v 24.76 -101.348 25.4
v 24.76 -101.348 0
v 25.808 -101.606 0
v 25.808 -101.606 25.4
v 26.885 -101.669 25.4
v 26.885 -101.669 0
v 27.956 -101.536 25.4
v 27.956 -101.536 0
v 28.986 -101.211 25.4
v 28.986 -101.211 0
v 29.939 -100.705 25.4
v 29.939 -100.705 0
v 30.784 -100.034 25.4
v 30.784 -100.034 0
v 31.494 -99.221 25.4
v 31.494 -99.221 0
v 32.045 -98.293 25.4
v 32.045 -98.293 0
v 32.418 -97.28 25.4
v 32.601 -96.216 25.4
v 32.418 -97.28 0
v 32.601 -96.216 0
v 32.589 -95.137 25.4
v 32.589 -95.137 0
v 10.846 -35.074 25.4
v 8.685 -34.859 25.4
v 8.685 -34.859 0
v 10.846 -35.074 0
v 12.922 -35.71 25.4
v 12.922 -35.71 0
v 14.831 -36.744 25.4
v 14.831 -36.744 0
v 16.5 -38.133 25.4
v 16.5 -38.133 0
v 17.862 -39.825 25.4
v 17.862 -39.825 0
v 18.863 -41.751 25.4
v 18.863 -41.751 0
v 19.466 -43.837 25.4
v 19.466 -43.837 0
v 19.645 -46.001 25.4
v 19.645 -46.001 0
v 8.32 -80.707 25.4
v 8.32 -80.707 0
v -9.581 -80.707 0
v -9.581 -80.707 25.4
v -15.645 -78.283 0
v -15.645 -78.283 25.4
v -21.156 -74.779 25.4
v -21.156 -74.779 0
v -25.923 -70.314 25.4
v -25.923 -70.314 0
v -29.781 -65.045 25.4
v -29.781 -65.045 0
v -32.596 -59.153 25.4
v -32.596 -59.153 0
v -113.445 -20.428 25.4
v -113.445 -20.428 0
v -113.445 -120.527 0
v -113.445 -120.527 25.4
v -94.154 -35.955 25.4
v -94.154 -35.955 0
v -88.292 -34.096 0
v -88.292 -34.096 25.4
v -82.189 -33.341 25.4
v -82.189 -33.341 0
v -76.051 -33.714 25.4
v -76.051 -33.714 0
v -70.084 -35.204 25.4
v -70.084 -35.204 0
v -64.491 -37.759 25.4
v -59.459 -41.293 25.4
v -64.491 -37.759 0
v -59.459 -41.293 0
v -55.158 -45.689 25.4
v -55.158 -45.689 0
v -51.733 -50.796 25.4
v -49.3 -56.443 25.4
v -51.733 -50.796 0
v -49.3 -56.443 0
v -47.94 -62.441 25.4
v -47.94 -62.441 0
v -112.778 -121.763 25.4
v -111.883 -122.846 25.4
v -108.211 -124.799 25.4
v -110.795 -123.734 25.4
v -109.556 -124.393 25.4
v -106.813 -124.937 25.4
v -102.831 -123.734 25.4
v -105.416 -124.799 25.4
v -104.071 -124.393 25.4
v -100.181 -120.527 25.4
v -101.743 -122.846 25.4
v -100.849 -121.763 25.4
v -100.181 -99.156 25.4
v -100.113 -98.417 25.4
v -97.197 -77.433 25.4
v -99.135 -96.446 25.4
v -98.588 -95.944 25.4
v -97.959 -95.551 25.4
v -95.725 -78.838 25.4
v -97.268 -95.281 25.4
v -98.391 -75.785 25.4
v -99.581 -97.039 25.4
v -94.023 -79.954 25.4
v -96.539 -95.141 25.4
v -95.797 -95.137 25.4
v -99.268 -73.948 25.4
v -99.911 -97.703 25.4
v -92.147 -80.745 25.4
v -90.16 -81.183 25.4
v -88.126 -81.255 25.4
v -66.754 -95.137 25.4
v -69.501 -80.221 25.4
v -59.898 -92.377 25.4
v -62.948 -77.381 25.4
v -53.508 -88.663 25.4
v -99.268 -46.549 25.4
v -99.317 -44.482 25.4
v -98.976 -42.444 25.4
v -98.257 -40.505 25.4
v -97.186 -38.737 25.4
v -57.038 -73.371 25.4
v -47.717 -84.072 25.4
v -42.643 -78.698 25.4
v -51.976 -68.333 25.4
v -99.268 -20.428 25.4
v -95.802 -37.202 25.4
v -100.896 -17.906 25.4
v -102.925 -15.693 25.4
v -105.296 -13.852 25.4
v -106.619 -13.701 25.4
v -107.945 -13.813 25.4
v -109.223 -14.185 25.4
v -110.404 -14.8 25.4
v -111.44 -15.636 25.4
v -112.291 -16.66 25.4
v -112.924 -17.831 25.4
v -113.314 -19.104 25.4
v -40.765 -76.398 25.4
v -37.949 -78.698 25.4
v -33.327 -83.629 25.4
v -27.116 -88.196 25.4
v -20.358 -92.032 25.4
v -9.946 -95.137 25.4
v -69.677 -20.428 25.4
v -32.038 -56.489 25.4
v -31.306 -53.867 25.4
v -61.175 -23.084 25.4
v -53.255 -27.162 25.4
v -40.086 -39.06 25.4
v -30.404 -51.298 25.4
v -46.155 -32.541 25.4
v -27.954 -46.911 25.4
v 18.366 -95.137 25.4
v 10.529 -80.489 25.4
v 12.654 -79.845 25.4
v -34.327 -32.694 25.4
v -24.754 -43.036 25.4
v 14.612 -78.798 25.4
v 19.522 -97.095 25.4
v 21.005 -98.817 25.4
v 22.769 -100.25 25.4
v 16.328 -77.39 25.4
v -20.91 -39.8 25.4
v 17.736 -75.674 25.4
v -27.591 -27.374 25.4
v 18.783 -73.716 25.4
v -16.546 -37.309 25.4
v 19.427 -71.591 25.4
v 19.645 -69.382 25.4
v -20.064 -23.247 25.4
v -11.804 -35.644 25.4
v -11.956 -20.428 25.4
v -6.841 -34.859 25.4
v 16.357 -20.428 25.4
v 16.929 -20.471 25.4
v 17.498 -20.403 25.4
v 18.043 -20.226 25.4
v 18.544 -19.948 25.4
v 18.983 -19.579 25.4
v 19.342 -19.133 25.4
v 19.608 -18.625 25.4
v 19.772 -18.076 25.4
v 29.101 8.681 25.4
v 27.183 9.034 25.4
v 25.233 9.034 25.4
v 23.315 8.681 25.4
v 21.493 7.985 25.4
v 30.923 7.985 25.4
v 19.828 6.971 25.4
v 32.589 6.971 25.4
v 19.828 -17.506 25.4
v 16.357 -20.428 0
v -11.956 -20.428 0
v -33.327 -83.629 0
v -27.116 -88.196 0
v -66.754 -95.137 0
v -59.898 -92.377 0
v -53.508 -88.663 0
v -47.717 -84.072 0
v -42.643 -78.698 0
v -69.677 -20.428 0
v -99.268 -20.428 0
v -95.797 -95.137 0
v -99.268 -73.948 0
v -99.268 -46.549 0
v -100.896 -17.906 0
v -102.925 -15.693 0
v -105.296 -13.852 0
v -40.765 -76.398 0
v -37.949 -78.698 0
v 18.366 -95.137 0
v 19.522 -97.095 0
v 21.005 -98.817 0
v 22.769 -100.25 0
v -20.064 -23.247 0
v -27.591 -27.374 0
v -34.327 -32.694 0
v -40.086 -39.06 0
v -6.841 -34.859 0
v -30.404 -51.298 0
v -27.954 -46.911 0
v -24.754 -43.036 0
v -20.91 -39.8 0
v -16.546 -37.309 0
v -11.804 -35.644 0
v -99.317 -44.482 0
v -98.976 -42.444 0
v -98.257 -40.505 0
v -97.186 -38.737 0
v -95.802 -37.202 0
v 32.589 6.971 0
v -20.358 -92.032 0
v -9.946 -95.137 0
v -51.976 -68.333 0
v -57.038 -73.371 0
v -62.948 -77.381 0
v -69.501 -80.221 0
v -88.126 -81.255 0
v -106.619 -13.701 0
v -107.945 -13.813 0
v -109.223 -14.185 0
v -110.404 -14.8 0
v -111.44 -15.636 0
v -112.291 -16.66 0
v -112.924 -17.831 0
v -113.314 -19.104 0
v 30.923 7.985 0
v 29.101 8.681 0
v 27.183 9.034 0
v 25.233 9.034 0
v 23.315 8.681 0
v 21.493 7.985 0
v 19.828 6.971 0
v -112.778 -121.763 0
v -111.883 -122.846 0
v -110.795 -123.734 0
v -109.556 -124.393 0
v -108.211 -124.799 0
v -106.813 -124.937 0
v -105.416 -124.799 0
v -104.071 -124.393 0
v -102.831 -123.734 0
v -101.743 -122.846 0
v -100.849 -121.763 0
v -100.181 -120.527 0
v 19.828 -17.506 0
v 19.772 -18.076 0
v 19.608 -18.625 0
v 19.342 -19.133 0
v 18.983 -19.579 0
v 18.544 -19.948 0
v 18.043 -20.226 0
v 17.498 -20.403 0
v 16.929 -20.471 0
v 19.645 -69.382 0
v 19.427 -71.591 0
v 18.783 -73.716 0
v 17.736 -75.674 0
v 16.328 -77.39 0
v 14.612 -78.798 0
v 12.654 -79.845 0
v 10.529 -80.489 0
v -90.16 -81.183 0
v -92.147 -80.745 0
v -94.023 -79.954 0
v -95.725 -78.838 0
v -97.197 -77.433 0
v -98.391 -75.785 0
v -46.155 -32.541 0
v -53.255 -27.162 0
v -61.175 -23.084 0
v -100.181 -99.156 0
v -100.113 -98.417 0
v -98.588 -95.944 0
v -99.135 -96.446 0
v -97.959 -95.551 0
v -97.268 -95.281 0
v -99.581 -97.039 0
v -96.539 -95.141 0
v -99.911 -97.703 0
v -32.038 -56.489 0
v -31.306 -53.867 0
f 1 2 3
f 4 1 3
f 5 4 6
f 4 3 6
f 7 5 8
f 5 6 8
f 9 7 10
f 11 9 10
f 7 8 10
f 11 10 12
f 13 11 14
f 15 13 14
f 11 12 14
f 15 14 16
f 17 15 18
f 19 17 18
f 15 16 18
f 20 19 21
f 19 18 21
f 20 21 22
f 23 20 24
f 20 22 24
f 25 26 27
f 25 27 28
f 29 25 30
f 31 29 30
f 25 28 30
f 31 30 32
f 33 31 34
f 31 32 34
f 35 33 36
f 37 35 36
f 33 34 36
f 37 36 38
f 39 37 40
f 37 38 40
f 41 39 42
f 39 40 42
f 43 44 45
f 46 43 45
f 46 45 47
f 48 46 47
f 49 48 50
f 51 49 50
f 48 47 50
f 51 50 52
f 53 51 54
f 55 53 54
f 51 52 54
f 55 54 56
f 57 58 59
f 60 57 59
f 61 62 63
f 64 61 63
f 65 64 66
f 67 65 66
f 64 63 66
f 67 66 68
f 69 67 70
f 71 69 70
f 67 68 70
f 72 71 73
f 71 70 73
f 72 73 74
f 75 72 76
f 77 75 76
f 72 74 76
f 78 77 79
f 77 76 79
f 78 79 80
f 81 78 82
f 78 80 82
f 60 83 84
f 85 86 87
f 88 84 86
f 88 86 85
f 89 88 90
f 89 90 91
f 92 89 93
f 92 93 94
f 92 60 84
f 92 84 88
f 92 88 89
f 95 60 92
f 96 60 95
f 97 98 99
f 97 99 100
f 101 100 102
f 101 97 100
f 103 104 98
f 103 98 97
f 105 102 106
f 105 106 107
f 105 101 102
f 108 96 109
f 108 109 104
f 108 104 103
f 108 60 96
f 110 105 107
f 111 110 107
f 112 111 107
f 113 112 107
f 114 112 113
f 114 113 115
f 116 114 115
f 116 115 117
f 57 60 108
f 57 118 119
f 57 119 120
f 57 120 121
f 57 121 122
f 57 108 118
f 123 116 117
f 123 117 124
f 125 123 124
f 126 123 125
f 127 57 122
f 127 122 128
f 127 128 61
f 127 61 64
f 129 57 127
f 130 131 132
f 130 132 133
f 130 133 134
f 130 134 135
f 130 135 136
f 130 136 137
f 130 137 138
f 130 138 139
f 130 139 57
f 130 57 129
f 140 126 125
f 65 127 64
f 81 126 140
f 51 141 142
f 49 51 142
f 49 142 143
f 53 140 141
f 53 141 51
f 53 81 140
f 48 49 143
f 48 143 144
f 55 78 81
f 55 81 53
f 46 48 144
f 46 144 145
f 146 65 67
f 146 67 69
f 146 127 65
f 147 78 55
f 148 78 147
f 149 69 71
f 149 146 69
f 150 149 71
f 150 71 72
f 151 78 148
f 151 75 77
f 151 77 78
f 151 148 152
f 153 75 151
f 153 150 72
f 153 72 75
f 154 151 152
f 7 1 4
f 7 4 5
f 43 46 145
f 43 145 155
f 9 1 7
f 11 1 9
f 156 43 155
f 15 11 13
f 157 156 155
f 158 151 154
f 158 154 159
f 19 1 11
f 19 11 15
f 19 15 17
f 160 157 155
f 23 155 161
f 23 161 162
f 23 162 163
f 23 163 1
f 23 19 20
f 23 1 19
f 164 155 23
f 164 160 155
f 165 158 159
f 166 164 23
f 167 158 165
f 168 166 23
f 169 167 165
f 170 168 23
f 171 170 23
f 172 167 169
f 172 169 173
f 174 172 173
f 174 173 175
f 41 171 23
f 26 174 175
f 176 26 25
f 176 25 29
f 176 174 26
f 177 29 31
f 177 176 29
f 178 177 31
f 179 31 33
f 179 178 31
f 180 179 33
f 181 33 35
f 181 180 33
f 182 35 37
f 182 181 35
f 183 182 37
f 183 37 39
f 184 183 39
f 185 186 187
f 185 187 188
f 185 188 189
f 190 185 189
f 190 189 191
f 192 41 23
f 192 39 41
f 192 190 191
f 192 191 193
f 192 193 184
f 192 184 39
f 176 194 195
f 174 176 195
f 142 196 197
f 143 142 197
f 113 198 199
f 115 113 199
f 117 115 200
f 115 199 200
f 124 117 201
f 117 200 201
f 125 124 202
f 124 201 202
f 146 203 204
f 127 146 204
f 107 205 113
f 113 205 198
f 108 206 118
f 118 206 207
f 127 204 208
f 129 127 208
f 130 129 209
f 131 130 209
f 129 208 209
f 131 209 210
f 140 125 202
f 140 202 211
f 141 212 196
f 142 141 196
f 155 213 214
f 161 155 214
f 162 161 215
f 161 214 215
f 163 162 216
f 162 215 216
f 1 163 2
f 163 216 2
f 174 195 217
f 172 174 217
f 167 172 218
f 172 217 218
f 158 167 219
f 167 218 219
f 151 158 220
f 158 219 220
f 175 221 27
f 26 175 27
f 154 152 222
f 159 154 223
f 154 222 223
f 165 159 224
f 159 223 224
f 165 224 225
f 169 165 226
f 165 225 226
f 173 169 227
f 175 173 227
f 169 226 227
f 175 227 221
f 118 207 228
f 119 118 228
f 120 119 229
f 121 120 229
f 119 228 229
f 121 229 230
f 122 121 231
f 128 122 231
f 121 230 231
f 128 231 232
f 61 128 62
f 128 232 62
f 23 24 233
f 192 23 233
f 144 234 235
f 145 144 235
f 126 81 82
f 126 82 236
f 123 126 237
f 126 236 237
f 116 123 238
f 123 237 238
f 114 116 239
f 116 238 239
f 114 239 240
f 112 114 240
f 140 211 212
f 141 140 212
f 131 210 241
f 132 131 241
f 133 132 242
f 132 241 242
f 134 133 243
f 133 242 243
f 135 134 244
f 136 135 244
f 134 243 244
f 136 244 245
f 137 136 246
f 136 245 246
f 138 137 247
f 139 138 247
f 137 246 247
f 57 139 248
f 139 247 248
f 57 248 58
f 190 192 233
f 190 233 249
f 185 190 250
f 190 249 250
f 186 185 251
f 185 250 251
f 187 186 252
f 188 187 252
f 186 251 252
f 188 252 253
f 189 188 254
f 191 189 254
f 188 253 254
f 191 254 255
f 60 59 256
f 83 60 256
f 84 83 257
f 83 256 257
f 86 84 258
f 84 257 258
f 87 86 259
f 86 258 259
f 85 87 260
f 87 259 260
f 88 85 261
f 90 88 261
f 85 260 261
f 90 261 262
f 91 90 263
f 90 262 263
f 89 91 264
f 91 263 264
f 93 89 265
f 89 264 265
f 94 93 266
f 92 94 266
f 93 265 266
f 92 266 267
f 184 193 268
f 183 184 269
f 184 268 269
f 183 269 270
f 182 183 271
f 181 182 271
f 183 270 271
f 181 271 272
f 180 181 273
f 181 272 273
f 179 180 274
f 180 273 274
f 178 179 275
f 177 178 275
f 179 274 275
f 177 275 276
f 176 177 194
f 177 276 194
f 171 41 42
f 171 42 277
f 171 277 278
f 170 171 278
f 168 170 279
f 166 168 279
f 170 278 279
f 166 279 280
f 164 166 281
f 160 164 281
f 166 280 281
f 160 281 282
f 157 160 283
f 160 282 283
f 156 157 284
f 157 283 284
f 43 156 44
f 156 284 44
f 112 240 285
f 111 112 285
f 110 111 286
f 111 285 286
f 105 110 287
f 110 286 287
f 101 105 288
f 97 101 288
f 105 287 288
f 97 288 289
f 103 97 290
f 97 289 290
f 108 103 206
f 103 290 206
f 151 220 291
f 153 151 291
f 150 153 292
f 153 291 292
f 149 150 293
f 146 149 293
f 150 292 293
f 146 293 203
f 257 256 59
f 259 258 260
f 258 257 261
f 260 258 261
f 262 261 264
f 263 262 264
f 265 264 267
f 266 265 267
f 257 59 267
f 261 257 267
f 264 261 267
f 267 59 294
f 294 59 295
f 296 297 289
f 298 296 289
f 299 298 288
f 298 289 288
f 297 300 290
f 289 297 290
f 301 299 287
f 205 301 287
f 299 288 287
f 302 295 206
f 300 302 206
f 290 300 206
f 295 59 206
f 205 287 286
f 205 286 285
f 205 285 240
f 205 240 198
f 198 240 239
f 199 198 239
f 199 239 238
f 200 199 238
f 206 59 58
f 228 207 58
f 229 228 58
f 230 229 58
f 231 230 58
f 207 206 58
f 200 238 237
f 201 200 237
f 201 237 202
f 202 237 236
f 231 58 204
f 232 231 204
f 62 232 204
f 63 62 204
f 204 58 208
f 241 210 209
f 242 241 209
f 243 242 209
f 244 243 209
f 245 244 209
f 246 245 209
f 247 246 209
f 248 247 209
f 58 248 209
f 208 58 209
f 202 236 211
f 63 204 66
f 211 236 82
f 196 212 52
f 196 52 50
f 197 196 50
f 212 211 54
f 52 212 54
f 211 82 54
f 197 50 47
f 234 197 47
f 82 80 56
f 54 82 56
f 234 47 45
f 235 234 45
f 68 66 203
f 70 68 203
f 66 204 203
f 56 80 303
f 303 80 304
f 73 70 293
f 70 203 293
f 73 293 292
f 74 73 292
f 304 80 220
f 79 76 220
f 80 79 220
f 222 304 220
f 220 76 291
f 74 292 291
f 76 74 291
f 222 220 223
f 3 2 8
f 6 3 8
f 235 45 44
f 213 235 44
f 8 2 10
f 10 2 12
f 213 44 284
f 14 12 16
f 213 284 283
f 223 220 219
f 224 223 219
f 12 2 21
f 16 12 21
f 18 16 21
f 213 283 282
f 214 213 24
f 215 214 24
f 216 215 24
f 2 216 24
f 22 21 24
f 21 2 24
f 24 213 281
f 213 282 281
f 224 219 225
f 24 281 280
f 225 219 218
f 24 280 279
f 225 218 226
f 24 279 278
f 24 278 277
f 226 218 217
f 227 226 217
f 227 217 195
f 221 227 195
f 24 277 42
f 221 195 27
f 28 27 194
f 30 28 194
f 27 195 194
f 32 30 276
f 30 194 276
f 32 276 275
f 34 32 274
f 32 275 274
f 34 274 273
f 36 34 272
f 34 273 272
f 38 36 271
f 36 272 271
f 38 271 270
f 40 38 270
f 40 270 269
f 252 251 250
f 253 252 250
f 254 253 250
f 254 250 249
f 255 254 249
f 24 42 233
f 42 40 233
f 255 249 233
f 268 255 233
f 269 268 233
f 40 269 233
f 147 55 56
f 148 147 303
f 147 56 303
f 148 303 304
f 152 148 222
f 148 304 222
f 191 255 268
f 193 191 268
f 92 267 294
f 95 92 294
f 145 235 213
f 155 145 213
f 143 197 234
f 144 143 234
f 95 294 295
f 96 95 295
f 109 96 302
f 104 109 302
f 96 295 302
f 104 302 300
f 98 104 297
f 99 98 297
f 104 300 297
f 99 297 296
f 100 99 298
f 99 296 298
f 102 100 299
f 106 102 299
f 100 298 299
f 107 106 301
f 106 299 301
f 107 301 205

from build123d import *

# Parameters (mm, degrees)
F2_DEPTH = 25.4


# Not quite as in the source:
# - the program builds the solid bodies; features that only make, move or delete a surface that nothing else refers to are left out


with BuildPart() as f2:
    # F0 (on Top) → F2 (new body)
    with BuildSketch(Plane.XY):
        with BuildLine():
            ThreePointArc((-105.2959337831, -13.8524966314), (-110.9424227524, -15.1925239823), (-113.4453713894, -20.4283390194))
            Line((-113.4453713894, -20.4283390194), (-113.4453713894, -120.5272600055))
            ThreePointArc((-113.4453713894, -120.5272600055), (-106.8133786321, -124.9365702093), (-100.1813858747, -120.5272600055))
            Line((-100.1813858747, -120.5272600055), (-100.1813858747, -99.1557762027))
            ThreePointArc((-100.1813858747, -99.1557762027), (-98.8733273351, -96.1822516833), (-95.7974940538, -95.1372087002))
            Line((-95.7974940538, -95.1372087002), (-66.7541921139, -95.1372087002))
            ThreePointArc((-66.7541921139, -95.1372087002), (-53.508361005, -88.6629146032), (-42.6427721977, -78.6975994706))
            Line((-42.6427721977, -78.6975994706), (-40.7650305092, -76.3982318447))
            Line((-40.7650305092, -76.3982318447), (-37.9493655476, -78.6975994706))
            Line((-37.9493655476, -78.6975994706), (-33.326998353, -83.6294814944))
            Line((-33.326998353, -83.6294814944), (-27.1164793521, -88.1960391998))
            Line((-27.1164793521, -88.1960391998), (-20.3579775989, -92.0319482684))
            Line((-20.3579775989, -92.0319482684), (-9.9462270737, -95.1372087002))
            Line((-9.9462270737, -95.1372087002), (-1.5437625116, -95.1372087002))
            Line((-1.5437625116, -95.1372087002), (11.6079188883, -95.1372087002))
            Line((11.6079188883, -95.1372087002), (18.3664243668, -95.1372087002))
            ThreePointArc((18.3664243668, -95.1372087002), (21.0049540589, -98.8169422623), (24.7596036643, -101.3477295637))
            ThreePointArc((24.7596036643, -101.3477295637), (30.3769038734, -100.3890234282), (32.5886048377, -95.1372087002))
            Line((32.5886048377, -95.1372087002), (32.5886048377, -83.264157176))
            Line((32.5886048377, -83.264157176), (32.5886048377, -36.867942661))
            Line((32.5886048377, -36.867942661), (32.5886048377, 6.9710011594))
            ThreePointArc((32.5886048377, 6.9710011594), (26.2081623077, 9.0786866715), (19.8277197778, 6.9710011594))
            Line((19.8277197778, 6.9710011594), (19.8277197778, -17.5057426095))
            ThreePointArc((19.8277197778, -17.5057426095), (18.7722789641, -19.7743587388), (16.3571424782, -20.4283390194))
            Line((16.3571424782, -20.4283390194), (-11.9555136189, -20.4283390194))
            ThreePointArc((-11.9555136189, -20.4283390194), (-27.5905728803, -27.3736232216), (-40.0855019689, -39.0598885715))
            ThreePointArc((-40.0855019689, -39.0598885715), (-53.2554420129, -27.1621160119), (-69.6767866611, -20.4283390194))
            Line((-69.6767866611, -20.4283390194), (-99.268078804, -20.4283390194))
            ThreePointArc((-99.268078804, -20.4283390194), (-101.8637236034, -16.7569920607), (-105.2959337831, -13.8524966314))
        make_face()
        with BuildLine():
            ThreePointArc((-94.1535308957, -35.954631865), (-64.4908309504, -37.7586891963), (-47.9399785399, -62.4406598508))
            ThreePointArc((-47.9399785399, -62.4406598508), (-57.037773934, -73.3713012414), (-69.5008059195, -80.2212381733))
            Line((-69.5008059195, -80.2212381733), (-88.1256759167, -81.2548696995))
            ThreePointArc((-88.1256759167, -81.2548696995), (-94.899092444, -79.4350063569), (-99.268078804, -73.9483833313))
            Line((-99.268078804, -73.9483833313), (-99.268078804, -46.5490445495))
            ThreePointArc((-99.268078804, -46.5490445495), (-98.2570203257, -40.5053887944), (-94.1535308957, -35.954631865))
        make_face(mode=Mode.SUBTRACT)
        with BuildLine():
            ThreePointArc((-30.4044019431, -51.2982606888), (-20.909712223, -39.8003863828), (-6.8409675732, -34.8586589098))
            Line((-6.8409675732, -34.8586589098), (8.6853252724, -34.8586589098))
            ThreePointArc((8.6853252724, -34.8586589098), (16.4998756565, -38.1334471627), (19.6450613439, -46.0010543466))
            Line((19.6450613439, -46.0010543466), (19.6450613439, -69.3818256259))
            ThreePointArc((19.6450613439, -69.3818256259), (16.328027351, -77.3898536128), (8.3199990913, -80.7068869472))
            Line((8.3199990913, -80.7068869472), (-9.5809019141, -80.7068854751))
            ThreePointArc((-9.5809019141, -80.7068854751), (-23.6431681808, -72.6575432123), (-32.5963497162, -59.1527372599))
            ThreePointArc((-32.5963497162, -59.1527372599), (-31.6935007339, -55.171603632), (-30.4044019431, -51.2982606888))
        make_face(mode=Mode.SUBTRACT)
    extrude(amount=F2_DEPTH)


solid = f2.part
